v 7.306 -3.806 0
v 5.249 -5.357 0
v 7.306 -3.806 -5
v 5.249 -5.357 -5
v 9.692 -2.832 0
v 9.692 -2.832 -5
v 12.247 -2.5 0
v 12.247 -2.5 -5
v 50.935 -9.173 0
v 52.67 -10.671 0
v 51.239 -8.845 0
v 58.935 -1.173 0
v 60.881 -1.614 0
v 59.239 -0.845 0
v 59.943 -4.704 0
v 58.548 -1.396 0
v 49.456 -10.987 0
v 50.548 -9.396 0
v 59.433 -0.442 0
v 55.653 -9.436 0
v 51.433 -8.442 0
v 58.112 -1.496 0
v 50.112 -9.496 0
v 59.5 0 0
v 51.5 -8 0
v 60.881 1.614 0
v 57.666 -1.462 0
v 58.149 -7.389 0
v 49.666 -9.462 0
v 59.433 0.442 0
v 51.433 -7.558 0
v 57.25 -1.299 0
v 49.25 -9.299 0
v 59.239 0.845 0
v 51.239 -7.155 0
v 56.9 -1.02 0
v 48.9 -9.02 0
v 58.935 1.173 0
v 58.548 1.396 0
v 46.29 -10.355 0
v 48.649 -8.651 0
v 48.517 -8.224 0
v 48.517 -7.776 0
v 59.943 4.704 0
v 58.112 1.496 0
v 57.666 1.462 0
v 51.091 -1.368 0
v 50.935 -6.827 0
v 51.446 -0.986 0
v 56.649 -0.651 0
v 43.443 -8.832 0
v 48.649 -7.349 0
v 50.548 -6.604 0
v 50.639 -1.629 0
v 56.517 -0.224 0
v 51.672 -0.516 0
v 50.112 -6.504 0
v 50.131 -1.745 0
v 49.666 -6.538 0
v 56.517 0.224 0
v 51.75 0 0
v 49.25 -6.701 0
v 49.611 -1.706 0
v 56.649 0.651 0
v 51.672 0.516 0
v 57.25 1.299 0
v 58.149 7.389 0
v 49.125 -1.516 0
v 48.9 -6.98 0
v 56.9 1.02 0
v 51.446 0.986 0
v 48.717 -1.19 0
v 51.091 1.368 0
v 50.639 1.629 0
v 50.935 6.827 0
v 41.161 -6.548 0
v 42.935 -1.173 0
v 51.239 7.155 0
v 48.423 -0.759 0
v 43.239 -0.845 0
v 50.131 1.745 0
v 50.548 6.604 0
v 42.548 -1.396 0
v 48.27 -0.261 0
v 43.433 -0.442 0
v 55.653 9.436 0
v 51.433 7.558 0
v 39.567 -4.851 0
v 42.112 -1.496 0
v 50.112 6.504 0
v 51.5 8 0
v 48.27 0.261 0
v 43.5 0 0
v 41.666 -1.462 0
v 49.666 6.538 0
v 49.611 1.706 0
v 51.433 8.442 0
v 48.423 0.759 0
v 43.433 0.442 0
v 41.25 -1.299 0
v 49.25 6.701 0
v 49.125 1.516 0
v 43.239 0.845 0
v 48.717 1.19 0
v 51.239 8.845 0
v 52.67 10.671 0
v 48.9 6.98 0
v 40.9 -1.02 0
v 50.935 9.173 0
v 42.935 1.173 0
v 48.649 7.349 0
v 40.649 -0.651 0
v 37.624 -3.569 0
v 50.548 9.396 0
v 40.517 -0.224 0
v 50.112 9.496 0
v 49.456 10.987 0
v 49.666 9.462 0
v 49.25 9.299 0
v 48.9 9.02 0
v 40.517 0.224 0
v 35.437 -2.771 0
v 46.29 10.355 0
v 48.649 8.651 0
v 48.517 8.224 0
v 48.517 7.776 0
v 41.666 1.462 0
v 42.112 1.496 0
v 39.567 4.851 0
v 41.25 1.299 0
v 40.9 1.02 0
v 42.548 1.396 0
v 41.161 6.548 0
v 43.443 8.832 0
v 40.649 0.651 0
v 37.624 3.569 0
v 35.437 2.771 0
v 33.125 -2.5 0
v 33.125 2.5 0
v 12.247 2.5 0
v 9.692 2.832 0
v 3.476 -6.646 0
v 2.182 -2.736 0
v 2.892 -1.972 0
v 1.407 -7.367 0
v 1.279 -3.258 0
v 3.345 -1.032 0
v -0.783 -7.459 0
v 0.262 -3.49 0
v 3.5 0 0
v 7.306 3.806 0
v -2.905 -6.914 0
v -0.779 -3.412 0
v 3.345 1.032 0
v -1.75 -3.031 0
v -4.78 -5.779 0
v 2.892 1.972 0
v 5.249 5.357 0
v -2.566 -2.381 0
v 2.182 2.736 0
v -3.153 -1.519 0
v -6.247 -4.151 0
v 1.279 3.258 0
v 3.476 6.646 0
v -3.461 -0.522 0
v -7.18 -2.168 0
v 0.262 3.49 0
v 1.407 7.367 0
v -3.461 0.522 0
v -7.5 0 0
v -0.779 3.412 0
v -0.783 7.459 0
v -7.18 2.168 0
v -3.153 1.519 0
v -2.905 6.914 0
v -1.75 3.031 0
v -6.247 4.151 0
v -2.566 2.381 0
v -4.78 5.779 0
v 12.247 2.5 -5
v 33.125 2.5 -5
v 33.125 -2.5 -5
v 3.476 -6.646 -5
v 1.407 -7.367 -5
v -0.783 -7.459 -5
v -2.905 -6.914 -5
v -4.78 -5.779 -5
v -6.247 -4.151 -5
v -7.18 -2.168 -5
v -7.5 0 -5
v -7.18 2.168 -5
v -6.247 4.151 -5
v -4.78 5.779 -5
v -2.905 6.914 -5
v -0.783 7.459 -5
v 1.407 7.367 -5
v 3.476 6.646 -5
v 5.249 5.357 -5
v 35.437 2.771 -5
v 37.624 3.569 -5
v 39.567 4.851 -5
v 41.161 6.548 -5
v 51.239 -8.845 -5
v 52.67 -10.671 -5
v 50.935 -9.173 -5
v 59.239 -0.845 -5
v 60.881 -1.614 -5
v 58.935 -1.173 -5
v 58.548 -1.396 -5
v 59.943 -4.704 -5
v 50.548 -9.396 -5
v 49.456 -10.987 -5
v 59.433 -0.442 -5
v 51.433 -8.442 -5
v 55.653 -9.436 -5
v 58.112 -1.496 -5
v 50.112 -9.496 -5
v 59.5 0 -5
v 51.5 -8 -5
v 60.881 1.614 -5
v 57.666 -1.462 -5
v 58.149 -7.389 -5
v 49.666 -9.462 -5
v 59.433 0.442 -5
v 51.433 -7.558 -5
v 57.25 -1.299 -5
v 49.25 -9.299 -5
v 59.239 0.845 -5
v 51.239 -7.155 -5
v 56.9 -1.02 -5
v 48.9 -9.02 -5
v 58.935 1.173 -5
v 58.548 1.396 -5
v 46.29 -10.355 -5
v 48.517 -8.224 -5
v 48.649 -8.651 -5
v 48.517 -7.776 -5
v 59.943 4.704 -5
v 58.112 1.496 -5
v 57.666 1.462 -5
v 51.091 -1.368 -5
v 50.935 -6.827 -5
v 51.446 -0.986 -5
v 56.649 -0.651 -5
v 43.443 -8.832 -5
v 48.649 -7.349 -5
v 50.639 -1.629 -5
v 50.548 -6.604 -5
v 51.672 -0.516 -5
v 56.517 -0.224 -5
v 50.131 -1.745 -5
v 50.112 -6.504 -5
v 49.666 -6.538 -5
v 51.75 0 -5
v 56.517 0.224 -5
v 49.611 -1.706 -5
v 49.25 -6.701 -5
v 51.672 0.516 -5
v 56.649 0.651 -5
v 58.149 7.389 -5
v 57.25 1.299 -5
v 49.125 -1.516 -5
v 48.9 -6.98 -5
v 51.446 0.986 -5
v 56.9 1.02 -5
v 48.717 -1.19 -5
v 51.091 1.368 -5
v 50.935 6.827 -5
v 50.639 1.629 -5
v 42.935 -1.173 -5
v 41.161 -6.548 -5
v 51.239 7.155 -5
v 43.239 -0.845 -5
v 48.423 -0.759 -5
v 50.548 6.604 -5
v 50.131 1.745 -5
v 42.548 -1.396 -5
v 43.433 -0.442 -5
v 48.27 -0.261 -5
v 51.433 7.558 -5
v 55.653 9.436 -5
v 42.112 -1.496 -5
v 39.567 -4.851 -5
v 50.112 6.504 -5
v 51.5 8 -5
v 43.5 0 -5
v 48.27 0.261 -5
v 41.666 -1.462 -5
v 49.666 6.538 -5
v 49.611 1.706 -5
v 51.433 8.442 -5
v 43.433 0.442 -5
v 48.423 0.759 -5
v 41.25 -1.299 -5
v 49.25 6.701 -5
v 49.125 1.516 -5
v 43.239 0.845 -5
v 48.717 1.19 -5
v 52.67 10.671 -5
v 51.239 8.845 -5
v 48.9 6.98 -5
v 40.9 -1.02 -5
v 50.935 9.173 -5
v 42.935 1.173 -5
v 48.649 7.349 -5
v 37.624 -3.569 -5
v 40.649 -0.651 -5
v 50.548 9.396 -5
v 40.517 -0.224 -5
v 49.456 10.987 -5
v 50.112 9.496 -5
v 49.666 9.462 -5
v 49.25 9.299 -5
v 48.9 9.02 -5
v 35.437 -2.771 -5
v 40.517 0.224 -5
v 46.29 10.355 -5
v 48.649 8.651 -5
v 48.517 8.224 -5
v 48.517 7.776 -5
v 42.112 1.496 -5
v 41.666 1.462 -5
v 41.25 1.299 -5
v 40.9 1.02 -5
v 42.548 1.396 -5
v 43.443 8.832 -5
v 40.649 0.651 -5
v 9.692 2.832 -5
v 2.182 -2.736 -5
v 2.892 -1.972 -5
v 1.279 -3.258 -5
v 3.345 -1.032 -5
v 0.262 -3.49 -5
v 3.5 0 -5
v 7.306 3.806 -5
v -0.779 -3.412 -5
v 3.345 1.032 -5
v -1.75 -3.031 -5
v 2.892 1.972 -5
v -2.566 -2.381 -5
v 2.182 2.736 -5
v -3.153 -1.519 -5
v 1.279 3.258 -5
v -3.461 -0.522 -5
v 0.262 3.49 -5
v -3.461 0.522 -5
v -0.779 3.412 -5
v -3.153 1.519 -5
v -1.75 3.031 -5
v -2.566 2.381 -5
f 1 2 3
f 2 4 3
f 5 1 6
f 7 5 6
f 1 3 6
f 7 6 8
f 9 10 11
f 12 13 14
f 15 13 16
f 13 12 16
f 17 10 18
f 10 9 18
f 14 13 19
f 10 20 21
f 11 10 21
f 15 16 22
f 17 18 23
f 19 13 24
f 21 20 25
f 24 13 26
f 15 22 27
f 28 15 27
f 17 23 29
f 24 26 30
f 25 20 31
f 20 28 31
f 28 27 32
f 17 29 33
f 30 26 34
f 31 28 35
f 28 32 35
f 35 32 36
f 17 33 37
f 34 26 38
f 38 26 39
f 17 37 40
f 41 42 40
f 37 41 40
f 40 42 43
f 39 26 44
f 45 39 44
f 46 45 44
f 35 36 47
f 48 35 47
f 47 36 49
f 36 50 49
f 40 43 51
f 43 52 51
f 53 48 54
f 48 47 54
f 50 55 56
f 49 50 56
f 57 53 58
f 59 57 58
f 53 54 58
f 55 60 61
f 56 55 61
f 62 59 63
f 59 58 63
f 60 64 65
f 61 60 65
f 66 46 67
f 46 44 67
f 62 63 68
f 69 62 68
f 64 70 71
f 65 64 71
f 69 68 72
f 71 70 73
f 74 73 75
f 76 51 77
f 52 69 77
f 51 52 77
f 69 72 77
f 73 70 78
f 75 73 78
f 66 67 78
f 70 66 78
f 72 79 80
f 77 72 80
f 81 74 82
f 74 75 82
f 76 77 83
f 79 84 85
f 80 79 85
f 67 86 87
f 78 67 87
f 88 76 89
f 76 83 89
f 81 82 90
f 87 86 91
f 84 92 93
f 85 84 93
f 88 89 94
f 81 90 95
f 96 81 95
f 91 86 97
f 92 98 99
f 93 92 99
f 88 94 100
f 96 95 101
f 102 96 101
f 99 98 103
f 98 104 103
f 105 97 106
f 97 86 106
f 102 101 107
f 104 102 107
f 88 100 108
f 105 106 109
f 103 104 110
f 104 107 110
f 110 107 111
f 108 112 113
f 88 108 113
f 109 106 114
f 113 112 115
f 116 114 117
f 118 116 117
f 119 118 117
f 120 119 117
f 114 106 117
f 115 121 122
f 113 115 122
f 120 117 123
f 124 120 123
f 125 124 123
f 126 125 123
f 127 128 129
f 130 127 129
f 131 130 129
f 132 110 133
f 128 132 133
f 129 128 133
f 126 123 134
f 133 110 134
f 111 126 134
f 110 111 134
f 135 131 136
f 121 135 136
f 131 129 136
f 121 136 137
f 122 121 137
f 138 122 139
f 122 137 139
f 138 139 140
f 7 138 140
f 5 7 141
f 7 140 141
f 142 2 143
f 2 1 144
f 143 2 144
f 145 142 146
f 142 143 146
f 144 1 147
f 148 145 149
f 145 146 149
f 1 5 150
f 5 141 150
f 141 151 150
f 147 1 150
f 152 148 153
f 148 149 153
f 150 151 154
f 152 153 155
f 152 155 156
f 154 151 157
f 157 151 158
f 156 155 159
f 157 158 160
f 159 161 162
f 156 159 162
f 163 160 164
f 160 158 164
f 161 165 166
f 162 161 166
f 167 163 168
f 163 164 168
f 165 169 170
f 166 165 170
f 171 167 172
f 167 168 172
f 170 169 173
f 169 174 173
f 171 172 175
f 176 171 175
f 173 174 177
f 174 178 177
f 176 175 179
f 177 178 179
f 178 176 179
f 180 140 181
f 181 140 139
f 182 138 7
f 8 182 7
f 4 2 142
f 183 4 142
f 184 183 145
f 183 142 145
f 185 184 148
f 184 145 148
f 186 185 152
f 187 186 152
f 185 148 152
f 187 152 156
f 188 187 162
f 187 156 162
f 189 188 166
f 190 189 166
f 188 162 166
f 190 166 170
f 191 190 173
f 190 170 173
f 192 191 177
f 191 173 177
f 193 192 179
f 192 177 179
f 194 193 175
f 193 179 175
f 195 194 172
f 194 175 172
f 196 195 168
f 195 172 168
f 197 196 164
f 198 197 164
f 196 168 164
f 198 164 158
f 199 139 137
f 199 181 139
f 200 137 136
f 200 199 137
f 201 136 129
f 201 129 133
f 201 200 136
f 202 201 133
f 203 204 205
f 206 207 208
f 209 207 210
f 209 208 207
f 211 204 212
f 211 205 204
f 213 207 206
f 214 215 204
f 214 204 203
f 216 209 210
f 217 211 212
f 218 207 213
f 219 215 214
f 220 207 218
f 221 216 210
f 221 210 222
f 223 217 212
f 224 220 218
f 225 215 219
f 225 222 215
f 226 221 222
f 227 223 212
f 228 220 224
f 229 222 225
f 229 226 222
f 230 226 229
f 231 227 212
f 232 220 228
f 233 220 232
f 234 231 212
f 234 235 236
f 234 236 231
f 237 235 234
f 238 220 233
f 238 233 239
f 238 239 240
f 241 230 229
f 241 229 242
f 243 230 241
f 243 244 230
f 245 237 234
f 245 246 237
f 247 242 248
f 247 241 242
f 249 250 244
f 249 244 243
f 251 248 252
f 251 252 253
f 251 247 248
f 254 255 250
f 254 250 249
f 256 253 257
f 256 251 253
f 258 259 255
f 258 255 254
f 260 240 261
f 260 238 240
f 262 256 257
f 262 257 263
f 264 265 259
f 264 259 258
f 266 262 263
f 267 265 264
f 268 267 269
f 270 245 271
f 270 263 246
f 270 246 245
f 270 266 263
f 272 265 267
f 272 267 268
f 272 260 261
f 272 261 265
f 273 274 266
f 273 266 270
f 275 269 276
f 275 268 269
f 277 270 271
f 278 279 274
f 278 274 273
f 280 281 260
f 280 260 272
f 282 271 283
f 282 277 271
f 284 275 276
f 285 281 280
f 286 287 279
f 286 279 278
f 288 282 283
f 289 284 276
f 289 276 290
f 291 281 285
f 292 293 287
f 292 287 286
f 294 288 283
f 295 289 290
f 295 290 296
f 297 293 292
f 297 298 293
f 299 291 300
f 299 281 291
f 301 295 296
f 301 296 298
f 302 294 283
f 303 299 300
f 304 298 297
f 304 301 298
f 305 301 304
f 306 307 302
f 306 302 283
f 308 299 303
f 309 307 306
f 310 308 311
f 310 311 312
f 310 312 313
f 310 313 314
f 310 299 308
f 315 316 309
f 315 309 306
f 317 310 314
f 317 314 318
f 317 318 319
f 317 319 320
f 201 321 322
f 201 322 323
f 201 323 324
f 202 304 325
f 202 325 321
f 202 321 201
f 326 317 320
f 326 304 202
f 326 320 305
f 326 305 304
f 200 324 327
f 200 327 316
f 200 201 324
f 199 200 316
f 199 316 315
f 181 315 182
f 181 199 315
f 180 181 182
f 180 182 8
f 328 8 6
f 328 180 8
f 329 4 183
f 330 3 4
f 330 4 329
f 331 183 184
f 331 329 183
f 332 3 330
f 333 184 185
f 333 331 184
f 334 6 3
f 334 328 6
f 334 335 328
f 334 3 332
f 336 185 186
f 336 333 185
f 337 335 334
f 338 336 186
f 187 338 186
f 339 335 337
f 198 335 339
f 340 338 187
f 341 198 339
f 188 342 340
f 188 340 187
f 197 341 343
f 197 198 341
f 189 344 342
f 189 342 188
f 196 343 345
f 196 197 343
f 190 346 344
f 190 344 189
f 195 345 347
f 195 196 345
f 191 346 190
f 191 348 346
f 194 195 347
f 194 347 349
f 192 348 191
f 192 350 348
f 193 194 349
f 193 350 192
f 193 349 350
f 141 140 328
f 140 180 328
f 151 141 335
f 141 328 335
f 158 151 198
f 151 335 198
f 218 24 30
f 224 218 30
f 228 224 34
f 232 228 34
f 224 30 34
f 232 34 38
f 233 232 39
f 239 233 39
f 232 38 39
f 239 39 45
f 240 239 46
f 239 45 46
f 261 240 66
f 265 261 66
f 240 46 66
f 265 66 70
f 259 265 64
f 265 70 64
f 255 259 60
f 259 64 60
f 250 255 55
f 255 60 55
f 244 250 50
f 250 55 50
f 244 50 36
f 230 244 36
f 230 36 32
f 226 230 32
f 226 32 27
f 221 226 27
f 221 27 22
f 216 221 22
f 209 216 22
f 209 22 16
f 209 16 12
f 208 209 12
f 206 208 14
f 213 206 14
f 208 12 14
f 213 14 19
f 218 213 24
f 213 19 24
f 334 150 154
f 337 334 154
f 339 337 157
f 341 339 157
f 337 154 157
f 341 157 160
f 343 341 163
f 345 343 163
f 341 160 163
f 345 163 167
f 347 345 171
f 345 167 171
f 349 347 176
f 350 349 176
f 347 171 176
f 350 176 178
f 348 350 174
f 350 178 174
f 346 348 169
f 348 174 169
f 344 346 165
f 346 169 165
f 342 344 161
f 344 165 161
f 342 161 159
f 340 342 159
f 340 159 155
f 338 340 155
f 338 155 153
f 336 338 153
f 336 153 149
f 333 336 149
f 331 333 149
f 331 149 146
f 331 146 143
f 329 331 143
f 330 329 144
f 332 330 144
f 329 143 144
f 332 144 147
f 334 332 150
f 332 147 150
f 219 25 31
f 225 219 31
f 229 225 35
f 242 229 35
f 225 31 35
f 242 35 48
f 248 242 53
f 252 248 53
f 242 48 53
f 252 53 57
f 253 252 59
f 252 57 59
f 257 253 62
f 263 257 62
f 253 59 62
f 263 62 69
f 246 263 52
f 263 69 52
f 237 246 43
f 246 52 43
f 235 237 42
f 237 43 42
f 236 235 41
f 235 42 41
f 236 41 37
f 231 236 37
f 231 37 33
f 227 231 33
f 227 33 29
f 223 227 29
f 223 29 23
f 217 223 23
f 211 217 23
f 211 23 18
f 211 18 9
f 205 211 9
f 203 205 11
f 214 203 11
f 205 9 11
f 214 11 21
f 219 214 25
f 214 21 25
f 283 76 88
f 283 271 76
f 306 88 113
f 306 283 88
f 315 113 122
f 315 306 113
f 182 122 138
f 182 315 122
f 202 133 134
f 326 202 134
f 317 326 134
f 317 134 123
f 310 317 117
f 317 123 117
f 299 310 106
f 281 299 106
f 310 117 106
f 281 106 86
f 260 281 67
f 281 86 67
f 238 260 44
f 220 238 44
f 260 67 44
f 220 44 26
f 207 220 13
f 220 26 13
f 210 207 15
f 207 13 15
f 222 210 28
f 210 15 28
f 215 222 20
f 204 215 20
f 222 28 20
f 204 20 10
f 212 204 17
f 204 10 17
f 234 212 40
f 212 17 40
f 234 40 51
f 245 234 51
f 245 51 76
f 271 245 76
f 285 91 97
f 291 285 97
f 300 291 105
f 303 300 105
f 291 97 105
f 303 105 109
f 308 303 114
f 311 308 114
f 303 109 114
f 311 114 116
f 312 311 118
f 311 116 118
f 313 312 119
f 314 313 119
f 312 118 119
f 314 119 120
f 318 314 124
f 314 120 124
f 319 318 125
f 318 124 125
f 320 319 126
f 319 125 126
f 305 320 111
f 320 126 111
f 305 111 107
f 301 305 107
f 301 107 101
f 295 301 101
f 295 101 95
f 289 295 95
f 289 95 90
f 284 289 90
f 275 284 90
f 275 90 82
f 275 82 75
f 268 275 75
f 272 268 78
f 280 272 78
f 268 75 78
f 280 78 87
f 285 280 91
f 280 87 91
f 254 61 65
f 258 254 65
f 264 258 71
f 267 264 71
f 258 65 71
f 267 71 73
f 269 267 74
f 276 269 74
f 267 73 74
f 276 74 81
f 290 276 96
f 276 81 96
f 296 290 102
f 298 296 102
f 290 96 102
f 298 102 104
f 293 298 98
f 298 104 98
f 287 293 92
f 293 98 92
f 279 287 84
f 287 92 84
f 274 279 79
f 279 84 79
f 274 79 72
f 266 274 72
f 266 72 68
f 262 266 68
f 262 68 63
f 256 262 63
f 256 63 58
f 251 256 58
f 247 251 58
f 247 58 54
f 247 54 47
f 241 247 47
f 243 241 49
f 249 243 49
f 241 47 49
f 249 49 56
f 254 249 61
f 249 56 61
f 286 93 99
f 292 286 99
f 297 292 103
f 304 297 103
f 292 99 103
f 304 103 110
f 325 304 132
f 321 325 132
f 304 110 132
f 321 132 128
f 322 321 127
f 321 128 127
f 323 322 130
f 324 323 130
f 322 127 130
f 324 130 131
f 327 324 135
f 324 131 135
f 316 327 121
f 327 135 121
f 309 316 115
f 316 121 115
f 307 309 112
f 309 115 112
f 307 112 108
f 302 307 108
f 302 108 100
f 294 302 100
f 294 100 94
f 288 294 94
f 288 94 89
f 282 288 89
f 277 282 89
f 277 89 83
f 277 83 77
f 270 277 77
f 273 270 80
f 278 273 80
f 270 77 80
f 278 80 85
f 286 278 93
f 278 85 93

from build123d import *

# Parameters (mm, degrees)
SKETCH1_R          = 3.5
SKETCH1_R_2        = 1.5
SKETCH1_R_3        = 1.75
BASE_FLANGE1_DEPTH = 5
FILLET1_R          = 10


# Sheet-metal steps are written as plain solids
with BuildPart() as part:
    # Sketch1 → Base-Flange1 (new body)
    with BuildSketch(Plane.XY):
        with BuildLine():
            Line((7.071067812, 2.5), (39.287857357, 2.5))
            ThreePointArc((39.287857357, 2.5), (61, 0), (39.287857357, -2.5))
            Line((39.287857357, -2.5), (7.071067812, -2.5))
            ThreePointArc((7.071067812, -2.5), (-7.5, 0), (7.071067812, 2.5))
        make_face()
        Circle(SKETCH1_R, mode=Mode.SUBTRACT)
        with Locations((50, 8)):
            Circle(SKETCH1_R_2, mode=Mode.SUBTRACT)
        with Locations((58, 0)):
            Circle(SKETCH1_R_2, mode=Mode.SUBTRACT)
        with Locations((50, -8)):
            Circle(SKETCH1_R_2, mode=Mode.SUBTRACT)
        with Locations((42, 0)):
            Circle(SKETCH1_R_2, mode=Mode.SUBTRACT)
        with Locations((50, 0)):
            Circle(SKETCH1_R_3, mode=Mode.SUBTRACT)
    extrude(amount=-BASE_FLANGE1_DEPTH)

    # Fillet1
    fillet1_edges = [part.edges().sort_by_distance(p)[0] for p in [
        (7.071067812, 2.5, -2.5),
        (39.287857357, 2.5, -2.5),
        (39.287857357, -2.5, -2.5),
        (7.071067812, -2.5, -2.5),
    ]]
    fillet(fillet1_edges, radius=FILLET1_R)


solid = part.part
